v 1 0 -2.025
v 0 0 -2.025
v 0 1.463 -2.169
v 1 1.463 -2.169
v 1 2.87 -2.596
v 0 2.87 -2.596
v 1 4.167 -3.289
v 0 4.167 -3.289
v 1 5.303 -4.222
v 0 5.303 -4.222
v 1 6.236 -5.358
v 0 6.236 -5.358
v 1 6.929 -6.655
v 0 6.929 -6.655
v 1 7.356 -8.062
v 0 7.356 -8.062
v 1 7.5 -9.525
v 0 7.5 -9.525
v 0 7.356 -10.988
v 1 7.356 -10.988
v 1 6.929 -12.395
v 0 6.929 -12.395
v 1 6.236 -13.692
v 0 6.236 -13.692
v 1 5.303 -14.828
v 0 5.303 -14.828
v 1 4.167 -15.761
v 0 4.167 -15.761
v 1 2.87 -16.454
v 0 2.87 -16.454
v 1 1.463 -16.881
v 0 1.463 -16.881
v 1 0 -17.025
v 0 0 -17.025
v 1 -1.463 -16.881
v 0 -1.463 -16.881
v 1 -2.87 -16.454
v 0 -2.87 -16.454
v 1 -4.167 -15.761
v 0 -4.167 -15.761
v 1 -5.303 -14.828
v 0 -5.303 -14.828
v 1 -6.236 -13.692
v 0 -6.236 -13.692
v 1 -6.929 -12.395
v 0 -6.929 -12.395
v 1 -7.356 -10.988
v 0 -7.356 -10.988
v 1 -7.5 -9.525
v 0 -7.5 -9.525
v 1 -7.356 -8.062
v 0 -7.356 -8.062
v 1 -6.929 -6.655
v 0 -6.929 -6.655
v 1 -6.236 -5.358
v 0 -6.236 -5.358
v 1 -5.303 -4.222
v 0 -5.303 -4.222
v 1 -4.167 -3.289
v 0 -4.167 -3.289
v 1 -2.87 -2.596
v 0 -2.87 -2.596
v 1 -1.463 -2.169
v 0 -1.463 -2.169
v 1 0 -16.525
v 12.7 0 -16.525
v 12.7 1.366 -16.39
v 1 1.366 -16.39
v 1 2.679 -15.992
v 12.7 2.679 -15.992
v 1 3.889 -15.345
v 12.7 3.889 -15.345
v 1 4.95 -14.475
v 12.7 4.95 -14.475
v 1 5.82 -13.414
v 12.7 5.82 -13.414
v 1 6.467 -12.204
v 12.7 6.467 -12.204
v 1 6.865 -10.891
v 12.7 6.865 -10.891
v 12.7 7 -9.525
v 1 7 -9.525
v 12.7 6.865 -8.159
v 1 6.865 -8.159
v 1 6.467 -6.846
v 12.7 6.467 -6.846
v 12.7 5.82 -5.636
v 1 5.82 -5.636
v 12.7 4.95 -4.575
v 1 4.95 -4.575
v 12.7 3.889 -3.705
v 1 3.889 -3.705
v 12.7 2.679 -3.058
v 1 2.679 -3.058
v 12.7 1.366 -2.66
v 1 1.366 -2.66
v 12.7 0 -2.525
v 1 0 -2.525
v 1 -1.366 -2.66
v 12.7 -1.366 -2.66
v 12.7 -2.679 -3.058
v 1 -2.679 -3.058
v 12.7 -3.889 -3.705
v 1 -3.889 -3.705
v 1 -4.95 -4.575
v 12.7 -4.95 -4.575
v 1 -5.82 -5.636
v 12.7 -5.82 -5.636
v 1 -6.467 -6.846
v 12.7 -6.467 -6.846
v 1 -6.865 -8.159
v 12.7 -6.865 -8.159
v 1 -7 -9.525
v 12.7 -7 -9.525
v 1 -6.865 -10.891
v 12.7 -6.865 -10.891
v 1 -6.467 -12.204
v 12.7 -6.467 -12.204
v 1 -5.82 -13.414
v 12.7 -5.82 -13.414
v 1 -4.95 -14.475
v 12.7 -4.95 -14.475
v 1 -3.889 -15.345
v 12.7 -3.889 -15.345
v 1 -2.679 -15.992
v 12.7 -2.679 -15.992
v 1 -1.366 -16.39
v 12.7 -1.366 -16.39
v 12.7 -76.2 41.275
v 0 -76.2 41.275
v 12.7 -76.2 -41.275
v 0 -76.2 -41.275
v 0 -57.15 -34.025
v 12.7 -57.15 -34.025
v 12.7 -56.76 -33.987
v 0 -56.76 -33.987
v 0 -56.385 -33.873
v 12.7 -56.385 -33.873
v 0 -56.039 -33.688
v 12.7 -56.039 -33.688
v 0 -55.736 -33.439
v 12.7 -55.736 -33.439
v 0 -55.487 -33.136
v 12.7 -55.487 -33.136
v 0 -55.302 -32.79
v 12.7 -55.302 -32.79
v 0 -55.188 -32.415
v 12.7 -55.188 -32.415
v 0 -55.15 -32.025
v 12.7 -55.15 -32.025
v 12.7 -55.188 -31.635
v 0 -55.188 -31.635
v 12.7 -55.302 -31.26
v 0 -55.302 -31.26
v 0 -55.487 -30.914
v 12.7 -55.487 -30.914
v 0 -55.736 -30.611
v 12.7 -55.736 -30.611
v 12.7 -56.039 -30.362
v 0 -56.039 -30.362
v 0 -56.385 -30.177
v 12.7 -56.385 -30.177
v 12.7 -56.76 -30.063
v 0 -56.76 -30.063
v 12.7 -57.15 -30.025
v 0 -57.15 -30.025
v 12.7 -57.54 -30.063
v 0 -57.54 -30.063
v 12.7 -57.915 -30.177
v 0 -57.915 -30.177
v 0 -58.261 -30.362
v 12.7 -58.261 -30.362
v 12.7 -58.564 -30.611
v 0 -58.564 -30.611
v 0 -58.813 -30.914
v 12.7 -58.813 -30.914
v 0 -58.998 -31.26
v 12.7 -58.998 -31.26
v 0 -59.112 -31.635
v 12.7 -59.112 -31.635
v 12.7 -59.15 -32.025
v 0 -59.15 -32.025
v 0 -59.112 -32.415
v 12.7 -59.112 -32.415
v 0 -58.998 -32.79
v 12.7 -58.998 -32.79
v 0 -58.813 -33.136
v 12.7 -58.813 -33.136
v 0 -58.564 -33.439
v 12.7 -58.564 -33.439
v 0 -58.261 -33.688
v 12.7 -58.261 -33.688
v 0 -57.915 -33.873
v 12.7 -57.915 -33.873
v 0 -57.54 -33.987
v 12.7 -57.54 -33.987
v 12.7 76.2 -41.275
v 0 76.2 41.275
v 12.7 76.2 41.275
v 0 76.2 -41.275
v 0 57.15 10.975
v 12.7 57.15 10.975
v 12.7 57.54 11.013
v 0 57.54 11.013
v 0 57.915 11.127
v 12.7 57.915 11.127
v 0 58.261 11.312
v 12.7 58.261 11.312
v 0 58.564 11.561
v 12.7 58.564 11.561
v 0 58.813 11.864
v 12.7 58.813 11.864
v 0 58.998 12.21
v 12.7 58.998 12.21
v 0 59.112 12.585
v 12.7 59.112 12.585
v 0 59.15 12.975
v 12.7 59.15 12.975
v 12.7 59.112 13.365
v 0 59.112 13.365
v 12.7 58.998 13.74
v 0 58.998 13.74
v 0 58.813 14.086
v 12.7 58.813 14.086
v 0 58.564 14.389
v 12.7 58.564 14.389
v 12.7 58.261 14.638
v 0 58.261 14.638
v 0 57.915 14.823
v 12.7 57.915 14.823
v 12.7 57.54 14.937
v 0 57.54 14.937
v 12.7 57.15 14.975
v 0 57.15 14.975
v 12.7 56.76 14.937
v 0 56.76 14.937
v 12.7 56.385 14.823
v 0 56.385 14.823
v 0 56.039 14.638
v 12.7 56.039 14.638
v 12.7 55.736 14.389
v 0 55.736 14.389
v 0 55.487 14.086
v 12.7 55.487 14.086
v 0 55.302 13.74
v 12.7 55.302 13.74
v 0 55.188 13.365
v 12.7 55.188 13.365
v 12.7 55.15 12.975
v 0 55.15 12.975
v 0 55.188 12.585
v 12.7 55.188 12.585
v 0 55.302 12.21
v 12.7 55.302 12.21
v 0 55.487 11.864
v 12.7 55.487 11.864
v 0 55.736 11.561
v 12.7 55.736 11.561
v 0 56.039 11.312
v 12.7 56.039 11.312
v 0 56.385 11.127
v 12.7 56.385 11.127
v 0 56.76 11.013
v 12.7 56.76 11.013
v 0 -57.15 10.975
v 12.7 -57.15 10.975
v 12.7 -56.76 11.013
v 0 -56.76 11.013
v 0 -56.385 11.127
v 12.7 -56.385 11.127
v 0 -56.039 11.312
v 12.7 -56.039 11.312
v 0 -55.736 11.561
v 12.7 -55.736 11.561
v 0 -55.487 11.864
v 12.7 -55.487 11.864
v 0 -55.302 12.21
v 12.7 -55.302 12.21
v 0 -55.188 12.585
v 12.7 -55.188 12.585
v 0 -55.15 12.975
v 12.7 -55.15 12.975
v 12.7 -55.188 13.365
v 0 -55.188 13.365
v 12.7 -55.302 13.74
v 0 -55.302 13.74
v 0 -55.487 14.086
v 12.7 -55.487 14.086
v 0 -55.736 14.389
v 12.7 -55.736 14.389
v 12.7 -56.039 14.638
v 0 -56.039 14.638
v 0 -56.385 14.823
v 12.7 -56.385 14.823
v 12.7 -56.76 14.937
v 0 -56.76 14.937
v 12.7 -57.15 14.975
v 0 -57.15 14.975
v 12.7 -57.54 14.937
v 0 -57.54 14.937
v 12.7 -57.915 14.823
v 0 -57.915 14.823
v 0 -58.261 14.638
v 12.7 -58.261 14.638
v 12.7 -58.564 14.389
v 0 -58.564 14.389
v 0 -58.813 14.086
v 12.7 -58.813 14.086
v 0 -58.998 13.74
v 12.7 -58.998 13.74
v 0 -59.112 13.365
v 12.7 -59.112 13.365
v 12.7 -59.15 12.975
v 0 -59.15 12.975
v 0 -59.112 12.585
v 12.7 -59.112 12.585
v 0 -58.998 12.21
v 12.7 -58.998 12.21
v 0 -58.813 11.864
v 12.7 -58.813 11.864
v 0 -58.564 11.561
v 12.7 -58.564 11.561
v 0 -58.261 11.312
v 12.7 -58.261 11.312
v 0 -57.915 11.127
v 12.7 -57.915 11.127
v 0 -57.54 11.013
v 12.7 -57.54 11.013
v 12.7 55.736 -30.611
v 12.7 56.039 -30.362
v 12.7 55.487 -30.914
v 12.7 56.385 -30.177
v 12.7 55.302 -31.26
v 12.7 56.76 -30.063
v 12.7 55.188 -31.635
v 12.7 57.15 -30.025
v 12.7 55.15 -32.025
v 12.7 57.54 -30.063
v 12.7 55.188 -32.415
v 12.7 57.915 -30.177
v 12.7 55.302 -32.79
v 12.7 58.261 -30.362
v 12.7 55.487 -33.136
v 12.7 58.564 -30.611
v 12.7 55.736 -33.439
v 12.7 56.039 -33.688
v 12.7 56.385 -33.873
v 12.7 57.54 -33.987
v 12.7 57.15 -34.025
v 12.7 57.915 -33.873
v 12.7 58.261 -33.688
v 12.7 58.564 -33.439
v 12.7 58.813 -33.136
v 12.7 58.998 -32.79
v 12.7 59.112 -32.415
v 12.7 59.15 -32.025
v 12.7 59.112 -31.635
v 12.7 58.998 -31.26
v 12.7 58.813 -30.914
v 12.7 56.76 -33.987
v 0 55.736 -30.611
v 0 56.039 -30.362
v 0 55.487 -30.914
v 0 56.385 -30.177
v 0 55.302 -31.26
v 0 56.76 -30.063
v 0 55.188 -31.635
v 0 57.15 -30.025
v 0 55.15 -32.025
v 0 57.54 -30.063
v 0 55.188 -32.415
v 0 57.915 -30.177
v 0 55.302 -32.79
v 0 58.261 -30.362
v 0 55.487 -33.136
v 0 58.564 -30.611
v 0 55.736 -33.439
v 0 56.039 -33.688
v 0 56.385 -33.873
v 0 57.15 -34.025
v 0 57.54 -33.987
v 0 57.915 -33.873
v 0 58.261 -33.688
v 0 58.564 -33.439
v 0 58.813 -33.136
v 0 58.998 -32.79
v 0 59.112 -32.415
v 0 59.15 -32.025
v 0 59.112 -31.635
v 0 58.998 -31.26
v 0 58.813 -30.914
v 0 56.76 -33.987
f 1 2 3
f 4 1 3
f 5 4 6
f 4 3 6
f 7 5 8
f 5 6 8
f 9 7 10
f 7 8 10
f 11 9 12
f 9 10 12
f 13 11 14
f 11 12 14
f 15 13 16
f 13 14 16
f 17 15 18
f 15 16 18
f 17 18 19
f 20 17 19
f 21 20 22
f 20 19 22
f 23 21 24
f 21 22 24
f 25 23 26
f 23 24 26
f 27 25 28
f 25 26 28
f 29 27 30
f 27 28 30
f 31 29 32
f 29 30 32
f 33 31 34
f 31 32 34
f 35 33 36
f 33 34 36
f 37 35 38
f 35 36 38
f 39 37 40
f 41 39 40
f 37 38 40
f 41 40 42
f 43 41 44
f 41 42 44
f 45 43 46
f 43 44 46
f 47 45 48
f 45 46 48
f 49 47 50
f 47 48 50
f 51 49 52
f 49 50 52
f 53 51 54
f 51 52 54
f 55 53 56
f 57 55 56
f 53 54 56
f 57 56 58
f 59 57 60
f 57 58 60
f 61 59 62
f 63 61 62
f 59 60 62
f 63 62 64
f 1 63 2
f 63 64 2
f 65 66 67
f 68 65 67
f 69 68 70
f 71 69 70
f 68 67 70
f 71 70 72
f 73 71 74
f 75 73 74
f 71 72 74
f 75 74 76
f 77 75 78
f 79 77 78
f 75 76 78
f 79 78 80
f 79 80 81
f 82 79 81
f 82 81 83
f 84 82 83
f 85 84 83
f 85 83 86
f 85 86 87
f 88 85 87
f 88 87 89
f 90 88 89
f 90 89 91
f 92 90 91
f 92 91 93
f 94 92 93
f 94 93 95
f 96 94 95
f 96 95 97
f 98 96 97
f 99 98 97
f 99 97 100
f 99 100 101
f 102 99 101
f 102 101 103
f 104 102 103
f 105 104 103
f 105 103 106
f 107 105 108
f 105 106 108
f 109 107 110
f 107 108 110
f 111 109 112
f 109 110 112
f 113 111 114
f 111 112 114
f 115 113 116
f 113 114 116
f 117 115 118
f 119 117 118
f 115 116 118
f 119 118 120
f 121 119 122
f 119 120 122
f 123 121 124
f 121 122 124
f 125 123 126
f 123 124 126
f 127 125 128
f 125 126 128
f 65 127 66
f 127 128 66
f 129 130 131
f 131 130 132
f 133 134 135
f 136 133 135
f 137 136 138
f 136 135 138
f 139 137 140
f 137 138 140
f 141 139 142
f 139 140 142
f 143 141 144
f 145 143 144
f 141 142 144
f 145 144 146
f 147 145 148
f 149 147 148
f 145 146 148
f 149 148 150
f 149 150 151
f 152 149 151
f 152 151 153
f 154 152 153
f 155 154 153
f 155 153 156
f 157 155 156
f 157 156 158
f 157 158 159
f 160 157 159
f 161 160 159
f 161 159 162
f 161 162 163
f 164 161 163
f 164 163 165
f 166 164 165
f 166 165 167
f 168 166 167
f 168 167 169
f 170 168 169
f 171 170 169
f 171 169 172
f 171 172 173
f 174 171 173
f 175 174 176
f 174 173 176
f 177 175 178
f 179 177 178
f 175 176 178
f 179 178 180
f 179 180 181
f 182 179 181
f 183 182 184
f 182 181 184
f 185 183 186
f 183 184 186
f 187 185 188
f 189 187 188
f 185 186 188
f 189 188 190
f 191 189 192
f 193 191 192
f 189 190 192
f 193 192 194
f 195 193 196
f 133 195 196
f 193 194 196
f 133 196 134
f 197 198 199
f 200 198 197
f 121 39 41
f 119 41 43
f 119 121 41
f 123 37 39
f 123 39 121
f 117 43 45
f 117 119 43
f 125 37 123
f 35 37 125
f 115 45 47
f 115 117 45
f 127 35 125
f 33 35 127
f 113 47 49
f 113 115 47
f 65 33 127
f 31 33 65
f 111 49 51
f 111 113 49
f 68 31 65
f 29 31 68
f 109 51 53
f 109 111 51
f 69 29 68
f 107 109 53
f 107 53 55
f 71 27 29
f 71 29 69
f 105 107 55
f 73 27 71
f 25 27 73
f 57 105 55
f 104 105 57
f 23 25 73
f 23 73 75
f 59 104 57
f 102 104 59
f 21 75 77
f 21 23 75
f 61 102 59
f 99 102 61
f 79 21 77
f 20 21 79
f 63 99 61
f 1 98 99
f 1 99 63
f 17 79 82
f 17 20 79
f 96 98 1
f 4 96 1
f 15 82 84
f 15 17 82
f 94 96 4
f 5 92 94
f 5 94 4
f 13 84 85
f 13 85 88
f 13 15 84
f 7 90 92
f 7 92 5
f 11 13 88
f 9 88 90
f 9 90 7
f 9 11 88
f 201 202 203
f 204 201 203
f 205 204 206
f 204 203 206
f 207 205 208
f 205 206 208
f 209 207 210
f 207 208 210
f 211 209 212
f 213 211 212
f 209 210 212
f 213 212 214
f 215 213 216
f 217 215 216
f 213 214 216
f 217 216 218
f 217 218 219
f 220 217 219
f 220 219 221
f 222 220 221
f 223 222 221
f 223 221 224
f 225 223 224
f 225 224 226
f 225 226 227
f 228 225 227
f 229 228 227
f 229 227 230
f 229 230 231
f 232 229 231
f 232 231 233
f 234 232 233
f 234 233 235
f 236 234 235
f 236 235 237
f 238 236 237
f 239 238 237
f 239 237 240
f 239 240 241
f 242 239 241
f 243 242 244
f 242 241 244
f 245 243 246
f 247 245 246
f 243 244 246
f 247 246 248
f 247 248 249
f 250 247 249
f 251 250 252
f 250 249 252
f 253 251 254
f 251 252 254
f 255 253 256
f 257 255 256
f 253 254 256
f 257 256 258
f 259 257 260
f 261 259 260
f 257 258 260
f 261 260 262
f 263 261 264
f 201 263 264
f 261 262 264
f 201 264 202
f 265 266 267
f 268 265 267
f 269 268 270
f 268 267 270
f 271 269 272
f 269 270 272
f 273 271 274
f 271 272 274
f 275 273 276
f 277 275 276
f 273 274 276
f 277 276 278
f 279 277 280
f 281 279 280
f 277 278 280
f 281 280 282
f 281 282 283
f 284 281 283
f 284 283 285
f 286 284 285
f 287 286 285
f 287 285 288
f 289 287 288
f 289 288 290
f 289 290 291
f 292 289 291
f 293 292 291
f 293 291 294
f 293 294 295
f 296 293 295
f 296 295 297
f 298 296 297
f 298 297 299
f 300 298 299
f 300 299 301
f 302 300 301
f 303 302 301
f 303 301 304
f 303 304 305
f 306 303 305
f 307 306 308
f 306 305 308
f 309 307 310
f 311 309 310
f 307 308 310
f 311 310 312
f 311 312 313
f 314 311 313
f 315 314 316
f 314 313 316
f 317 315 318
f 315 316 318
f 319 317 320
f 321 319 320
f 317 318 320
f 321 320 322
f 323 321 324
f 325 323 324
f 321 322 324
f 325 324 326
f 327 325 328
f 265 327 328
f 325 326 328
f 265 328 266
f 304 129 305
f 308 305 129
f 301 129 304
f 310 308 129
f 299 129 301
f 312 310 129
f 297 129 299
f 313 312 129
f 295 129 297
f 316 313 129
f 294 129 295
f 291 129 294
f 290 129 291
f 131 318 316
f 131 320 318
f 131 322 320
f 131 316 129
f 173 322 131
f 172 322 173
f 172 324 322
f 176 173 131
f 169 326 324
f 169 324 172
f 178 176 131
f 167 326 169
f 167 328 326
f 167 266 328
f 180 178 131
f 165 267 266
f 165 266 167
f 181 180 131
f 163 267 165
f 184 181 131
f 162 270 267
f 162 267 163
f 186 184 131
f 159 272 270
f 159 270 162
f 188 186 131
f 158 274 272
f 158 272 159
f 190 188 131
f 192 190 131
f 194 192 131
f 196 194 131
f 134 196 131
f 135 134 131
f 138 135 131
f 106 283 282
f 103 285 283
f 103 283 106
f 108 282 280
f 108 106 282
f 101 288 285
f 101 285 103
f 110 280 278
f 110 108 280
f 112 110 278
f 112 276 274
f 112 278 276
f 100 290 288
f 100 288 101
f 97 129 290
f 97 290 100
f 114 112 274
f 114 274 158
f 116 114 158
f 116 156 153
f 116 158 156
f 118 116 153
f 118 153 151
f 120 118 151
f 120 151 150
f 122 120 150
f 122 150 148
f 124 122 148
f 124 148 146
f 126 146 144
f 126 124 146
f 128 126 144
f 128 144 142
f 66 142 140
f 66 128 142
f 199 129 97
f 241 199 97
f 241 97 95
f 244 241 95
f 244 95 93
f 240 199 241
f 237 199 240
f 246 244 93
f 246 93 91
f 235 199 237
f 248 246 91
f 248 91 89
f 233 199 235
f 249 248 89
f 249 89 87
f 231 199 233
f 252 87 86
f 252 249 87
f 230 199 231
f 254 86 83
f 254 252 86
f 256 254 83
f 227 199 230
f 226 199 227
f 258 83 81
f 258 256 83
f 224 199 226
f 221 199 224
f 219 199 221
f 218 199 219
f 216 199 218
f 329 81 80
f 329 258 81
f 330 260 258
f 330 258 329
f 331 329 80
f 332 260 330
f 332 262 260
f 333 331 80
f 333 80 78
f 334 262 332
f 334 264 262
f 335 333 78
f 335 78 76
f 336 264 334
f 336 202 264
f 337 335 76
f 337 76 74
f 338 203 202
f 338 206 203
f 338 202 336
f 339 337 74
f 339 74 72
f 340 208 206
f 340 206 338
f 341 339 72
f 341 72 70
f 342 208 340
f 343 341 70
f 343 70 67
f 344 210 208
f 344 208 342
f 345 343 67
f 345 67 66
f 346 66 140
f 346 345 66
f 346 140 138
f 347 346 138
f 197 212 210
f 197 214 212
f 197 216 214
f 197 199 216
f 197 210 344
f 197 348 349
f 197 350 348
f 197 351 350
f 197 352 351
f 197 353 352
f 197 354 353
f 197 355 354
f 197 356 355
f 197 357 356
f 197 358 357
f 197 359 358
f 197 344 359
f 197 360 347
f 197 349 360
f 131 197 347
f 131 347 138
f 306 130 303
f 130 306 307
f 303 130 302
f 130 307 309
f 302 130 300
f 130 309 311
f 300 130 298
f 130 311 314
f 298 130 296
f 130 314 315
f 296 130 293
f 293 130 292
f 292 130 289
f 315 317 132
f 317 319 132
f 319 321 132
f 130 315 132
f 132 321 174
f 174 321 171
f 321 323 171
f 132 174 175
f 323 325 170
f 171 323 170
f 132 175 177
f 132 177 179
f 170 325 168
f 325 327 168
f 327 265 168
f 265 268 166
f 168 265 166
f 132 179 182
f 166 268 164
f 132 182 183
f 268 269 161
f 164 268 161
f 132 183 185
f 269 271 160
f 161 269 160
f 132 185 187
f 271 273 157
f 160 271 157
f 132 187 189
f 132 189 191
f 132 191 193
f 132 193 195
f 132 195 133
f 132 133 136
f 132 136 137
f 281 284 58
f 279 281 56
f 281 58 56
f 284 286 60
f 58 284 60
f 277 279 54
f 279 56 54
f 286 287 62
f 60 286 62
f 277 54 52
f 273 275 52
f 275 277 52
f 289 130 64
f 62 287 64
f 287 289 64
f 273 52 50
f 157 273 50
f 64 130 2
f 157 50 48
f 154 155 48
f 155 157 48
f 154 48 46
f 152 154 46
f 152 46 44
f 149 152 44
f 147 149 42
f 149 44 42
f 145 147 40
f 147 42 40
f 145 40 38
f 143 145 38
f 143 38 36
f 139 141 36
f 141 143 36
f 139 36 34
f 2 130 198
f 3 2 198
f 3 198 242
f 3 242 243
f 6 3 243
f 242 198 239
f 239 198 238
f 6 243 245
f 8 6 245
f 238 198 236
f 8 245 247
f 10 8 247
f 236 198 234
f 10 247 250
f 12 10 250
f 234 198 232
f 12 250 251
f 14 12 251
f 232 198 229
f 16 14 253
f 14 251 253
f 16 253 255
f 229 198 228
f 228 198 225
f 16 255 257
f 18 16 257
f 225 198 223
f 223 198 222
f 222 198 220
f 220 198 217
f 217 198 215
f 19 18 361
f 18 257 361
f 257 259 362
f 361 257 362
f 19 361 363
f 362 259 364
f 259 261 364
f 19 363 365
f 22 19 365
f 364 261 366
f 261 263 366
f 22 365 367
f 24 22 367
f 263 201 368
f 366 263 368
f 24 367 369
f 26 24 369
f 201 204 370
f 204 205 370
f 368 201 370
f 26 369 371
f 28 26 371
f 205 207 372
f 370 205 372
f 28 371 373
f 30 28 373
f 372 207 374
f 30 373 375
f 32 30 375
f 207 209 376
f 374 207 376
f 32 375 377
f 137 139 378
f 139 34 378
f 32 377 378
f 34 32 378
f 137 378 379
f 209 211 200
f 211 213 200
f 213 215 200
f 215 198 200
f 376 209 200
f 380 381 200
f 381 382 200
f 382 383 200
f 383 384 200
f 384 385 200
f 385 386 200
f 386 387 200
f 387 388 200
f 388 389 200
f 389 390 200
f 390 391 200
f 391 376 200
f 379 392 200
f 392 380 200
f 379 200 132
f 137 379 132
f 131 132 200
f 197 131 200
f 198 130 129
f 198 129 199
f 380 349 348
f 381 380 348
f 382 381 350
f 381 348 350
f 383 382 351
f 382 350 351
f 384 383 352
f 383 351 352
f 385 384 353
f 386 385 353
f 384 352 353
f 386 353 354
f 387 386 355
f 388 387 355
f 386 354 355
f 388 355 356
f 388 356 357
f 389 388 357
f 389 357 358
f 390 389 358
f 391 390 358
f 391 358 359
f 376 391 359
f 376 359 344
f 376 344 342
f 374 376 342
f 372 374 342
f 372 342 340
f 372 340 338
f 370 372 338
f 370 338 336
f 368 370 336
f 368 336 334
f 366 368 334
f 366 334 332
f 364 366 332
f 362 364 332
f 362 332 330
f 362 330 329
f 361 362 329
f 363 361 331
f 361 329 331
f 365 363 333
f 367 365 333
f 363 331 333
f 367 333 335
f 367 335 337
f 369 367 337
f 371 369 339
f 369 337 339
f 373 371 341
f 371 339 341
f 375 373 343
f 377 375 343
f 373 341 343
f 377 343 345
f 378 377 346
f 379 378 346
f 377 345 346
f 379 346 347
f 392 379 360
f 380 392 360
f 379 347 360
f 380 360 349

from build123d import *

# Parameters (mm, degrees)
ESQUISSE1_W             = 82.55
ESQUISSE1_H             = 152.4
BOSS_EXTRU_1_DEPTH      = 12.7
ESQUISSE2_R             = 2
ENL_V_MAT_EXTRU_1_DEPTH = 88.586275323
ESQUISSE3_R             = 7
ENL_V_MAT_EXTRU_2_DEPTH = 88.586275323
ESQUISSE5_R             = 7.5
ENL_V_MAT_EXTRU_4_DEPTH = 1


with BuildPart() as part:
    # Esquisse1 → Boss.-Extru.1 (new body)
    with BuildSketch(Plane(origin=(0, 0, 0), x_dir=(0, 0, -1), z_dir=(1, 0, 0))):
        Rectangle(ESQUISSE1_W, ESQUISSE1_H)
    extrude(amount=BOSS_EXTRU_1_DEPTH)

    # Esquisse2 → Enlèv. mat.-Extru.1 (cut, through all)
    with BuildSketch(Plane(origin=(12.7, 0, 0), x_dir=(0, 0, -1), z_dir=(1, 0, 0))):
        with Locations((-12.974999958, 57.15)):
            Circle(ESQUISSE2_R)
        with Locations((32.025000042, 57.15)):
            Circle(ESQUISSE2_R)
        with Locations((-12.974999958, -57.15)):
            Circle(ESQUISSE2_R)
        with Locations((32.025000042, -57.15)):
            Circle(ESQUISSE2_R)
    extrude(amount=-ENL_V_MAT_EXTRU_1_DEPTH, mode=Mode.SUBTRACT)

    # Esquisse3 → Enlèv. mat.-Extru.2 (cut, through all)
    with BuildSketch(Plane(origin=(12.7, 0, 0), x_dir=(0, 0, -1), z_dir=(1, 0, 0))):
        with Locations((9.525, 0)):
            Circle(ESQUISSE3_R)
    extrude(amount=-ENL_V_MAT_EXTRU_2_DEPTH, mode=Mode.SUBTRACT)

    # Esquisse5 → Enlèv. mat.-Extru.4 (cut)
    with BuildSketch(Plane.ZY):
        with Locations((-9.525, 0)):
            Circle(ESQUISSE5_R)
    extrude(amount=-ENL_V_MAT_EXTRU_4_DEPTH, mode=Mode.SUBTRACT)


solid = part.part
